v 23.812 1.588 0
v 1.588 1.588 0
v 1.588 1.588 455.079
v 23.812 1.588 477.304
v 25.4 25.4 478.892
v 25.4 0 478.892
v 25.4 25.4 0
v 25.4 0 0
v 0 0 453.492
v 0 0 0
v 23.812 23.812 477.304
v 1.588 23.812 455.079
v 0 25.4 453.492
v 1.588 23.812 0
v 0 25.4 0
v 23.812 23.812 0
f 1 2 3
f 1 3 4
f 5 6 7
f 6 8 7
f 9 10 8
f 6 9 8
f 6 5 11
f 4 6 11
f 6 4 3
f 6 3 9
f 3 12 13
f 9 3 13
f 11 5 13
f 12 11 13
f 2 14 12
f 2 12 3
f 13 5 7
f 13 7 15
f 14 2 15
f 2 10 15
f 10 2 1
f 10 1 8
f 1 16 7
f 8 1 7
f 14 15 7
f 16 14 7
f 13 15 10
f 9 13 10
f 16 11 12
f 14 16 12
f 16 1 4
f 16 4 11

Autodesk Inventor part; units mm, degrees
ref_plane "YZ Plane" through (0, 0, 0) normal (1, 0, 0) x (0, 1, 0)
ref_plane "XZ Plane" through (0, 0, 0) normal (0, 1, 0) x (-1, 0, 0)
ref_plane "XY Plane" through (0, 0, 0) normal (0, 0, 1) x (1, 0, 0)
sketch "Sketch1" plane through (0, 0, 0) normal (0, 0, 1) x (1, 0, 0)
  line L0 (0, 0) -> (25.4, 0)
  line L1 (25.4, 0) -> (25.4, 25.4)
  line L2 (25.4, 25.4) -> (0, 25.4)
  line L3 (0, 25.4) -> (0, 0)
  line L4 (1.5875, 1.5875) -> (23.8125, 1.5875)
  line L5 (23.8125, 1.5875) -> (23.8125, 23.8125)
  line L6 (23.8125, 23.8125) -> (1.5875, 23.8125)
  line L7 (1.5875, 23.8125) -> (1.5875, 1.5875)
  dimension "d0" = 25.4
  dimension "d1" = 25.4
  dimension "d2" = 1.5875
extrude "Extrusion1" add sketch "Sketch1" along normal blind 478.8916
sketch "Sketch2" plane through (0, 25.4, 0) normal (0, 1, 0) x (1, 0, 0)
  line L0 (0, -478.8916) -> (25.4, -478.8916) projected
  line L1 (25.4, -478.8916) -> (0, -453.4916)
  line L2 (0, -453.4916) -> (0, -478.8916)
  line L3 (0, -478.8916) -> (25.4, -478.8916)
  point P0 (0, 0)
  dimension "d5" = 25.4
extrude "Extrusion2" cut sketch "Sketch2" against normal blind 25.4
properties part number "SUP_007_ConnectorBar" material "Aluminum 6061"
